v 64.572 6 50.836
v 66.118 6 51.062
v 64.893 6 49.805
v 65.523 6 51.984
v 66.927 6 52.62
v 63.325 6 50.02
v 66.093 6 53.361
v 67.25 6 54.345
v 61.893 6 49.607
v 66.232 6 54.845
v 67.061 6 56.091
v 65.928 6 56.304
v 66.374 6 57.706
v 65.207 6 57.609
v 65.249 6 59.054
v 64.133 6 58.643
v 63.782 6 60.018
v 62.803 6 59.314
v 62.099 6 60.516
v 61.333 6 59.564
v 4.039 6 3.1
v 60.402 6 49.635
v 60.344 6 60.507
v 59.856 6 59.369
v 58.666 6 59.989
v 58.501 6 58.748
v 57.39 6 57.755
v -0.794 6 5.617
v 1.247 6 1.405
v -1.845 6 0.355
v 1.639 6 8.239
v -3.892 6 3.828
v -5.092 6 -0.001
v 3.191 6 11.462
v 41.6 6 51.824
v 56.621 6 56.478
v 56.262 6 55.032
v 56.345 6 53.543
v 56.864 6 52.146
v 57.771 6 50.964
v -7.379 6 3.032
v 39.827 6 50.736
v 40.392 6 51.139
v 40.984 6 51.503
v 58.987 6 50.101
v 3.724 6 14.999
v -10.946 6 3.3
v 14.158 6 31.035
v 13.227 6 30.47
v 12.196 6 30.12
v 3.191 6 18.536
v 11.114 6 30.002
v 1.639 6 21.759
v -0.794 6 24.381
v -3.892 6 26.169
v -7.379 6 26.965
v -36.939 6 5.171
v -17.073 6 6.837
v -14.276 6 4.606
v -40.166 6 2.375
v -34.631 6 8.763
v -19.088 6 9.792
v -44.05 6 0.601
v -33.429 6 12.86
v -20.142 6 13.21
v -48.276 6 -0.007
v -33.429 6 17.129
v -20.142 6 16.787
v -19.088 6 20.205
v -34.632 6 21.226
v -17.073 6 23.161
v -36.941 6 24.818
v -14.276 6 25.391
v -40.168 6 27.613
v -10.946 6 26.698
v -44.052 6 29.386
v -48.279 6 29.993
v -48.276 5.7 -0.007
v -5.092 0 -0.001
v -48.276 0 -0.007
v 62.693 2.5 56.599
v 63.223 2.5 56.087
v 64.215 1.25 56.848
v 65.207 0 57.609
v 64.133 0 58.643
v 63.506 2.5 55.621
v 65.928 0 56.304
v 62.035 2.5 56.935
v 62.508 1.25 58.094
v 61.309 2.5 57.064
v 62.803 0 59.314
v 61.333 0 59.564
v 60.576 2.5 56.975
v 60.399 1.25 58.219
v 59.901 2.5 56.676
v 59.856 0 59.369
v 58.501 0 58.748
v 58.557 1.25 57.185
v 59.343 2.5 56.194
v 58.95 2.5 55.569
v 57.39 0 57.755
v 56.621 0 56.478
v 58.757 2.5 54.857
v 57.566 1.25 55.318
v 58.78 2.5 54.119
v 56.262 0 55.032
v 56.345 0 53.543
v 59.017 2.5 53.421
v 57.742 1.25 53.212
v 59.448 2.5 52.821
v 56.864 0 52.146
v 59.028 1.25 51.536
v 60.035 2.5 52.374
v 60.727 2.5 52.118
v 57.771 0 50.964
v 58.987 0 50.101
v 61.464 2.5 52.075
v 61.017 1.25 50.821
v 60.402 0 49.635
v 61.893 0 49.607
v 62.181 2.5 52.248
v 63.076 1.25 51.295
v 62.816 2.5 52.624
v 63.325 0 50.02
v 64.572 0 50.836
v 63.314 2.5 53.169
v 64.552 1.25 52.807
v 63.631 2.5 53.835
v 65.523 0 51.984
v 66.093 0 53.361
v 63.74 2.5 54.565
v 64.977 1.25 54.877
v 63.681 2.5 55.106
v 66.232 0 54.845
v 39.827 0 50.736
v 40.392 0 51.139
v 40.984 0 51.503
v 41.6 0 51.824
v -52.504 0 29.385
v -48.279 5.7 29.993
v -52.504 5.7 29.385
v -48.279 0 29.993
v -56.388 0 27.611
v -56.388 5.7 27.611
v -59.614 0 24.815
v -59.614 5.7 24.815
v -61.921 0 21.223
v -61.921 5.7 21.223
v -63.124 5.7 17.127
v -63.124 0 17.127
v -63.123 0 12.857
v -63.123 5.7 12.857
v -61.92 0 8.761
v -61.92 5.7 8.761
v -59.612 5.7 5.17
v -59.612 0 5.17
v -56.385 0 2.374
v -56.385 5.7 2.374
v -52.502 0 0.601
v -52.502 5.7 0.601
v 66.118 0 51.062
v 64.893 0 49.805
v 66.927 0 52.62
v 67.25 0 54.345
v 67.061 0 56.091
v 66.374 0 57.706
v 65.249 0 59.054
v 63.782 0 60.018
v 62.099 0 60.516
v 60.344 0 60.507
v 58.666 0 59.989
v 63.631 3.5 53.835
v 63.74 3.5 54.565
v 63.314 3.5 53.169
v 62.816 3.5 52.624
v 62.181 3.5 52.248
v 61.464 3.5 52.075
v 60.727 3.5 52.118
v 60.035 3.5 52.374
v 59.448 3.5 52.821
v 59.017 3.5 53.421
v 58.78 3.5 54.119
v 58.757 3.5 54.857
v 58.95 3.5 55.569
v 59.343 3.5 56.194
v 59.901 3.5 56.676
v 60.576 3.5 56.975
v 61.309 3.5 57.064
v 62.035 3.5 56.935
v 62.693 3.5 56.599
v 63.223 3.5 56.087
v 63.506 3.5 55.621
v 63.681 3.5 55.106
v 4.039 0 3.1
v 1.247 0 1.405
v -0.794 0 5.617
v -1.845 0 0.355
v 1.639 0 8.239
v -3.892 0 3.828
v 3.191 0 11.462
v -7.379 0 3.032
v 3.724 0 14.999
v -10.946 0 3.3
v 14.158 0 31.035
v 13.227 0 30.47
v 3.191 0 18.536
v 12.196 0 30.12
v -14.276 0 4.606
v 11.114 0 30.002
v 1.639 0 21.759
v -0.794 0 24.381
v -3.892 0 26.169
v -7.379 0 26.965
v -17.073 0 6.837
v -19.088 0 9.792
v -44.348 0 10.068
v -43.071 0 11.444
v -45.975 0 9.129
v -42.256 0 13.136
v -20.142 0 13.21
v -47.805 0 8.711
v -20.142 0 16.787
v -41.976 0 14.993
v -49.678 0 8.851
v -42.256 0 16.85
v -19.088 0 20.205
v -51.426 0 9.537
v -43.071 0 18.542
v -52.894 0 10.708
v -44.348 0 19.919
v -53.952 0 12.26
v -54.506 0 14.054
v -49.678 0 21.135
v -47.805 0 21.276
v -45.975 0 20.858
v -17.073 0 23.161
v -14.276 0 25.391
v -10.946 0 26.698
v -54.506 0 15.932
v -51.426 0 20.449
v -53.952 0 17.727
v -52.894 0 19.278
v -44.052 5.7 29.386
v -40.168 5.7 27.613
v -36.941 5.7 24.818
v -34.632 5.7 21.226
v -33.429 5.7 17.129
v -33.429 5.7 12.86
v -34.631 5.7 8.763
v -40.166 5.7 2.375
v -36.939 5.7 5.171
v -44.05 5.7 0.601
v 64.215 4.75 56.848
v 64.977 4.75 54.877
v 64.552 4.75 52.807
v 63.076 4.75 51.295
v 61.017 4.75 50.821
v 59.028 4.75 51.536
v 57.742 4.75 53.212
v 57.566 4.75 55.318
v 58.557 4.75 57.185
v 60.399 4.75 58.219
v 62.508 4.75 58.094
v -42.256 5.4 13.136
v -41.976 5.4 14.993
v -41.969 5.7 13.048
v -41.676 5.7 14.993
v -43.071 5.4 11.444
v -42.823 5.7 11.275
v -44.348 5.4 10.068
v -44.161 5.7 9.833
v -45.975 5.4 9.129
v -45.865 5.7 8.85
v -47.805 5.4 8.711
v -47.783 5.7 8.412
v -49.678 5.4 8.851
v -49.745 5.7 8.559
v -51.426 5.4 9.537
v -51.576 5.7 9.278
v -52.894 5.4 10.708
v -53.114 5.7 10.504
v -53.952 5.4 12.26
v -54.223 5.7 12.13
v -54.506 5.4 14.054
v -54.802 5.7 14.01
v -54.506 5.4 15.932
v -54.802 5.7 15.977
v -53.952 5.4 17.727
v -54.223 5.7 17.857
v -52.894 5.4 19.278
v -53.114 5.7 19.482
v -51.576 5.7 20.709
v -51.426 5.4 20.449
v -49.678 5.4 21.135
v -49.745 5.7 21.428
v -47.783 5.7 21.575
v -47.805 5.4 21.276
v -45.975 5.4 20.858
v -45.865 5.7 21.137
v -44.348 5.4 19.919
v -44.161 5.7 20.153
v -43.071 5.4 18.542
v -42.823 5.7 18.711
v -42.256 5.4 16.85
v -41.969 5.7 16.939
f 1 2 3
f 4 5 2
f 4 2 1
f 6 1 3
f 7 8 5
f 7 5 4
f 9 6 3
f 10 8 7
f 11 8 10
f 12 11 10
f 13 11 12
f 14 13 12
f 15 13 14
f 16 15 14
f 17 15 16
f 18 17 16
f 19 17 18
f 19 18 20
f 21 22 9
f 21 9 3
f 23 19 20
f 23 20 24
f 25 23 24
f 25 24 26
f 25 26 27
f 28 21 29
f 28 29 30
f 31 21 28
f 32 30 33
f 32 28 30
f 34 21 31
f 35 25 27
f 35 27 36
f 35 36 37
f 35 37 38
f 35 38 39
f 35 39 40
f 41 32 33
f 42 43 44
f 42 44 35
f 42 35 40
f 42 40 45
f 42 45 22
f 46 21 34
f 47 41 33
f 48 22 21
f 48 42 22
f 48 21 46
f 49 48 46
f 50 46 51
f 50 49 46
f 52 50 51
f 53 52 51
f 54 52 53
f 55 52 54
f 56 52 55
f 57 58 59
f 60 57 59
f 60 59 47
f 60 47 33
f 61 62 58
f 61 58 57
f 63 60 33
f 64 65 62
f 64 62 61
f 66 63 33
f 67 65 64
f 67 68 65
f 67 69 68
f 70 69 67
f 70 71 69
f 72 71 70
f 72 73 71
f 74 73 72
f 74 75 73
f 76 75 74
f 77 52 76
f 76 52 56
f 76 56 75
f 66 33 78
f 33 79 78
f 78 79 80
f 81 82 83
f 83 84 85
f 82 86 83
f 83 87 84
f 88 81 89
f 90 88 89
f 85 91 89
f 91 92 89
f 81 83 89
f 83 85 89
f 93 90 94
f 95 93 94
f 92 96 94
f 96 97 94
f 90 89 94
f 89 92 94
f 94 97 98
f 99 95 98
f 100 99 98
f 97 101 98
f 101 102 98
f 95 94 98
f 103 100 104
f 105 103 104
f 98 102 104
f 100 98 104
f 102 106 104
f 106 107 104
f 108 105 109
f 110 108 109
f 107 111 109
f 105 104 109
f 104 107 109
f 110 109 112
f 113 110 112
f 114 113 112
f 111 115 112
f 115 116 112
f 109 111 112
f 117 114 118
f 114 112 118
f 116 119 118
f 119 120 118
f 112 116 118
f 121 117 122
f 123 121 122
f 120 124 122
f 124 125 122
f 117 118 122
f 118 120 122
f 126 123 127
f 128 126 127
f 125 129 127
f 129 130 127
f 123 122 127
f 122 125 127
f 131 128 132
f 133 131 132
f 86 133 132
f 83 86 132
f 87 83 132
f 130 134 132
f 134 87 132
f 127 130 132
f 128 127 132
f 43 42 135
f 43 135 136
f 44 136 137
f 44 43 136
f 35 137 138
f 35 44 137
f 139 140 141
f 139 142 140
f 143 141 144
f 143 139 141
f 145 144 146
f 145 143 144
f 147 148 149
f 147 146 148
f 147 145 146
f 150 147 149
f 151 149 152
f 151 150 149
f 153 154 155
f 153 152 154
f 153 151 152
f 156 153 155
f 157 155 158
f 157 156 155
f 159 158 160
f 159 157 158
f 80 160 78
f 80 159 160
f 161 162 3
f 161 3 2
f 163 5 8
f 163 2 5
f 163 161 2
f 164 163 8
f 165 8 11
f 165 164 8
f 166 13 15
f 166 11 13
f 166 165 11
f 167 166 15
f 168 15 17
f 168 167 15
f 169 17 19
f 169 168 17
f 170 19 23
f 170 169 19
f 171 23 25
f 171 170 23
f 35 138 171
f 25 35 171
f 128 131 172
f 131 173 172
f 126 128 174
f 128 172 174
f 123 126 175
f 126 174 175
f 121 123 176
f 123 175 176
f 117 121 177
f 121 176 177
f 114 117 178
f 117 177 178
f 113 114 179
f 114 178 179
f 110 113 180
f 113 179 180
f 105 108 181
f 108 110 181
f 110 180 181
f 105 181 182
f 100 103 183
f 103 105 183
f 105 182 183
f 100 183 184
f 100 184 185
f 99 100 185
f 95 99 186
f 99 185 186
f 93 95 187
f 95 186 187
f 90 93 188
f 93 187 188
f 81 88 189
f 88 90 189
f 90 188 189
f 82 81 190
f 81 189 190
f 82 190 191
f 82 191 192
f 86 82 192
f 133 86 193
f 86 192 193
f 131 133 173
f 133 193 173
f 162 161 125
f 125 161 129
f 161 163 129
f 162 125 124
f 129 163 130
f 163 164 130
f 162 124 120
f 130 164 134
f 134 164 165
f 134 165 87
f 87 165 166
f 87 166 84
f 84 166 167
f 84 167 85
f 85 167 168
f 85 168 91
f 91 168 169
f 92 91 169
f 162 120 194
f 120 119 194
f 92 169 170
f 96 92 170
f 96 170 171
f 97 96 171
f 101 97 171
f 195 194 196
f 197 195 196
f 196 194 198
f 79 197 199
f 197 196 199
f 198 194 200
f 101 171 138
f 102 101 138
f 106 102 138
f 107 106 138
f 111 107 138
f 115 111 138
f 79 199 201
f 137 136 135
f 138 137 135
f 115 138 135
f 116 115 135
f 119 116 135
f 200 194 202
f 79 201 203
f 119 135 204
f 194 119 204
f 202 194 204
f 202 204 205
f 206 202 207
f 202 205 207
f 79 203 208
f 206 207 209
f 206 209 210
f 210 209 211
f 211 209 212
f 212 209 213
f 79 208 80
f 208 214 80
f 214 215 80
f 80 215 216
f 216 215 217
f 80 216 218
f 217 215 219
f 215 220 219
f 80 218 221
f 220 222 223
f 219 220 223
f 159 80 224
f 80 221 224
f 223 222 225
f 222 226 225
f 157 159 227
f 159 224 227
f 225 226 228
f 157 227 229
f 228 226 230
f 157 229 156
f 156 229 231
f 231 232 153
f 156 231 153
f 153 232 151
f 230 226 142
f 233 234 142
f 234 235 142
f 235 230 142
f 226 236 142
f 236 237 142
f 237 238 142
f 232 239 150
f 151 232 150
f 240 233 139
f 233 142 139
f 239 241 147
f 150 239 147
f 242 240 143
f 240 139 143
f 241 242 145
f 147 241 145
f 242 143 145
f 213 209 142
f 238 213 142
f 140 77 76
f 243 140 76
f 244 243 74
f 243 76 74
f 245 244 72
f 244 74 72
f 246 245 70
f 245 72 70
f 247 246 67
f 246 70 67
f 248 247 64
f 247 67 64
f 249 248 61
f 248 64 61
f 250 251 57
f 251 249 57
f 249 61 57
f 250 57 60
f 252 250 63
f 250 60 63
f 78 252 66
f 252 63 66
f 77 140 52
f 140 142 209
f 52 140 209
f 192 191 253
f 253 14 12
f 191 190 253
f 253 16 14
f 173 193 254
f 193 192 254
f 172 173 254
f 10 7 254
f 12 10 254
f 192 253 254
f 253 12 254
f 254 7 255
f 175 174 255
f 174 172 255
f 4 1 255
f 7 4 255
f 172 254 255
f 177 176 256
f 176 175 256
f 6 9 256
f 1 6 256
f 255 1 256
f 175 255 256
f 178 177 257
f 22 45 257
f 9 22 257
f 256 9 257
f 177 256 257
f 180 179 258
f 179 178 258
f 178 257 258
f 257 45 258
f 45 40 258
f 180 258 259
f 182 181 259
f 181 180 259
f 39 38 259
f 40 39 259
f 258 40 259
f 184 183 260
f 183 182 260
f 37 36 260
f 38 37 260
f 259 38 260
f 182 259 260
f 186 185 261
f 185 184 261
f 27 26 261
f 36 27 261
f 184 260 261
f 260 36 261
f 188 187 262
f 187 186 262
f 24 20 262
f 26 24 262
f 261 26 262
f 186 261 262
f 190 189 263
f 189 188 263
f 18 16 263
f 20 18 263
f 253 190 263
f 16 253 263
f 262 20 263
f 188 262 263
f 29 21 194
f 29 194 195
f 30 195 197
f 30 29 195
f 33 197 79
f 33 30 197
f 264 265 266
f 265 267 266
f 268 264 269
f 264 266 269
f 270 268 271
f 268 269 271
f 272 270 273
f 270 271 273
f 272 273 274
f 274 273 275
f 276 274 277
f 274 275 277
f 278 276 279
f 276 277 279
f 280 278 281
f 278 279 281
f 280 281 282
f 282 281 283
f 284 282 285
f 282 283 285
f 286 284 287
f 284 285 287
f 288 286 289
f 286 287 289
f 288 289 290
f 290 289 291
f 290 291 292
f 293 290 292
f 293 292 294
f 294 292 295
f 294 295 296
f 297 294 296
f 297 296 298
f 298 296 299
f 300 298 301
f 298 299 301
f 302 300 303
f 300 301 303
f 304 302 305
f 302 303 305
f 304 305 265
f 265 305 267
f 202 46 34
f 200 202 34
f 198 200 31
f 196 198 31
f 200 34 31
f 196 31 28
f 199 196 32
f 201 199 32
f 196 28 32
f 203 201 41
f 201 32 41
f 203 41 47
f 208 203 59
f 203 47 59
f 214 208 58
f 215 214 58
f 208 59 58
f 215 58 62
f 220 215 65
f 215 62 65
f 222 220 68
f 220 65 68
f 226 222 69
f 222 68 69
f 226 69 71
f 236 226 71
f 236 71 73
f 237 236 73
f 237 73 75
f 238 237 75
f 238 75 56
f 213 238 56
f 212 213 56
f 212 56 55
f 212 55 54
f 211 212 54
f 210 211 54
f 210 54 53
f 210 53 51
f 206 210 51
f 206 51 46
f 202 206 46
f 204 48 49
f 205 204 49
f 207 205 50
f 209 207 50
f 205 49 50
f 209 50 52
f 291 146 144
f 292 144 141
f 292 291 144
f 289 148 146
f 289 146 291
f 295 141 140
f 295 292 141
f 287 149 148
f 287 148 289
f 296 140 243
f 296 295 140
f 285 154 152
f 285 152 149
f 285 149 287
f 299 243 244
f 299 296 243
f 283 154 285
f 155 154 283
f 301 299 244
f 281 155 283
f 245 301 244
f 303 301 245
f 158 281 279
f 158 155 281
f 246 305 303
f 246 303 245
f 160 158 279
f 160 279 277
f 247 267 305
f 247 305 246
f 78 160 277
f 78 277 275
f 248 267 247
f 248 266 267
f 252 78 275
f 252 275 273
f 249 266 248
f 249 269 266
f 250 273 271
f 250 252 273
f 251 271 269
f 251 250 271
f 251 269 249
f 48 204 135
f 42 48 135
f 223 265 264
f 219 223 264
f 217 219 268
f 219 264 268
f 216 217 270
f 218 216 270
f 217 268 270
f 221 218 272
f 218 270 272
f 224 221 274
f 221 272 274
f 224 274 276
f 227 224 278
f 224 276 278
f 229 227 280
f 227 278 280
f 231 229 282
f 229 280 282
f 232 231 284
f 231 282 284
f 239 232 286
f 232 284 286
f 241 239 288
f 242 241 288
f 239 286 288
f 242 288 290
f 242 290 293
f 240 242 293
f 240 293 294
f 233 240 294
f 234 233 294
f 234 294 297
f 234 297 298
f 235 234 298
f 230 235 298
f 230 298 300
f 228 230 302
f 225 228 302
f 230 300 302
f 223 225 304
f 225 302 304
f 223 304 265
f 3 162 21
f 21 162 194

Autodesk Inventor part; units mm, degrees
ref_plane "YZ Plane" through (0, 0, 0) normal (1, 0, 0) x (0, 1, 0)
ref_plane "XZ Plane" through (0, 0, 0) normal (0, 1, 0) x (-1, 0, 0)
sketch "Sketch1" plane through (0, 0, 0) normal (0, 1, 0) x (-1, 0, 0)
  line L0 (0, 0) -> (48.2762, -0.0067)
  line L1 (-64.893, 49.805) -> (0, 0)
  line L2 (-40.6563, 51.3726) -> (-58.6663, 59.989)
  line L3 (-12.8113, 30.0018) -> (-40.6563, 51.3726)
  line L4 (48.2788, 29.9933) -> (-12.8113, 30.0018)
  arc A0 (-58.6663, 59.989) -> (-64.893, 49.805) centre (-61.2549, 54.5762) ccw
  arc A1 (48.2762, -0.0067) -> (48.2788, 29.9933) centre (48.2762, 14.9933) ccw
  point P0 (0, 0)
  dimension "d0" = 0
  dimension "d1" = 0
  dimension "d2" = 15
  dimension "d3" = 48.2762
  dimension "d4" = 48.2762
  dimension "d5" = 61.0901
  dimension "d6" = 109.5311
  dimension "d7" = 6
  dimension "d8" = 168.062
  dimension "d9" = 30
  dimension "d10" = 16
  dimension "d11" = 18.01
extrude "Extrusion1" add sketch "Sketch1" along normal blind 6
sketch "Sketch2" plane through (0, 6, 0) normal (0, 1, 0) x (1, 0, 0)
  arc A0 (-48.2762, 0.0067) -> (-48.2788, -29.9933) centre (-48.2762, -14.9933) ccw projected
  circle A1 centre (-48.2762, -14.9933) radius 15
  point P0 (0, 0)
  point P1 (-48.2788, -29.9933)
  point P2 (-48.2762, 0.0067)
extrude "Extrusion2" cut sketch "Sketch2" against normal blind 0.3
sketch "Sketch3" plane through (0, 6, 0) normal (0, 1, 0) x (1, 0, 0)
  circle A0 centre (-8.2762, -14.9988) radius 12
  arc A1 (-48.2762, 0.0067) -> (-48.2788, -29.9933) centre (-48.2762, -14.9933) ccw projected
  line L0 (-48.2788, -29.9933) -> (12.8113, -30.0018) projected
  point P0 (0, 0)
  point P1 (-63.2762, -14.992)
  dimension "d16" = 55
  dimension "d17" = 15
  dimension "d18" = 24
extrude "Extrusion3" cut sketch "Sketch3" against normal blind 10
sketch "Sketch8" plane through (0, 5.7, 0) normal (0, 1, 0) x (1, 0, 0)
  arc A0 (-48.2762, 0.0067) -> (-48.2788, -29.9933) centre (-48.2762, -14.9933) ccw projected
  circle A1 centre (-48.2762, -14.9933) radius 6.3
  point P0 (0, 0)
  dimension "d37" = 12.6
extrude "Extrusion4" cut sketch "Sketch8" against normal blind 10
chamfer "Chamfer1" distance 0.3 angle 45 1 edges at (-54.5762, 5.7, 14.9933) measured on face at (-46.8281, 5.7, 26.9329)
fillet "Fillet1" radius 15 1 edges at (0, 3, 0)
fillet "Fillet2" radius 5 1 edges at (12.8113, 3, 30.0018)
fillet "Fillet3" radius 10 1 edges at (40.6563, 3, 51.3726)
sketch "Sketch15" plane through (64.893, 0, 49.805) normal (0.6088, 0, -0.7933) x (-0.7933, 0, -0.6088)
  point P0 (81.8024, 0)
sketch "Sketch16" plane through (0, 6, 0) normal (0, 1, 0) x (1, 0, 0)
  point P0 (0, 0)
ref_plane "Work Plane3" through (61.2399, 0, 54.5647) normal (0.6088, 0, -0.7933) x (-0.7933, 0, -0.6088)
sketch "Sketch18" plane through (61.2399, 0, 54.5647) normal (0.6088, 0, -0.7933) x (-0.7933, 0, -0.6088)
  line L0 (0, 6) -> (76.7109, 6) projected
  line L1 (0, 6) -> (0, 3.5)
  line L2 (0, 0) -> (0, 6) projected
  line L3 (-2.5, 3.5) -> (-5, 6)
  line L4 (0, 6) -> (-6.0189, 6) projected
  line L5 (-2.5, 3.5) -> (0, 3.5)
  line L6 (-6.0189, 0) -> (-6.0189, 6) projected
  line L7 (-6.0189, 3) -> (0, 3) construction
  line L8 (0, 0) -> (0, 2.5)
  line L9 (-2.5, 2.5) -> (-5, 0)
  line L10 (-2.5, 2.5) -> (0, 2.5)
  line L11 (-5, 0) -> (0, 0)
  line L12 (17.2493, 0) -> (-1.2609, 0) projected
  point P0 (81.8024, 0)
  point P1 (-1.2609, 6)
  point P2 (0, 2.5)
  dimension "d75" = 2.5
  dimension "d76" = 2.5
  dimension "d77" = 5
revolve "Revolution1" cut sketch "Sketch18" angle 360 about axis through (61.2399, 6, 54.5647) along (0, -1, 0)
sketch "Sketch19" plane through (61.2399, 3.5, 54.5647) normal (0, 1, 0) x (1, 0, 0)
  circle A0 centre (0, 0) radius 2.5
  point P0 (-61.2399, 54.5647)
extrude "Extrusion6" cut sketch "Sketch19" against normal blind 10
properties part number "31-10-201-novi"
